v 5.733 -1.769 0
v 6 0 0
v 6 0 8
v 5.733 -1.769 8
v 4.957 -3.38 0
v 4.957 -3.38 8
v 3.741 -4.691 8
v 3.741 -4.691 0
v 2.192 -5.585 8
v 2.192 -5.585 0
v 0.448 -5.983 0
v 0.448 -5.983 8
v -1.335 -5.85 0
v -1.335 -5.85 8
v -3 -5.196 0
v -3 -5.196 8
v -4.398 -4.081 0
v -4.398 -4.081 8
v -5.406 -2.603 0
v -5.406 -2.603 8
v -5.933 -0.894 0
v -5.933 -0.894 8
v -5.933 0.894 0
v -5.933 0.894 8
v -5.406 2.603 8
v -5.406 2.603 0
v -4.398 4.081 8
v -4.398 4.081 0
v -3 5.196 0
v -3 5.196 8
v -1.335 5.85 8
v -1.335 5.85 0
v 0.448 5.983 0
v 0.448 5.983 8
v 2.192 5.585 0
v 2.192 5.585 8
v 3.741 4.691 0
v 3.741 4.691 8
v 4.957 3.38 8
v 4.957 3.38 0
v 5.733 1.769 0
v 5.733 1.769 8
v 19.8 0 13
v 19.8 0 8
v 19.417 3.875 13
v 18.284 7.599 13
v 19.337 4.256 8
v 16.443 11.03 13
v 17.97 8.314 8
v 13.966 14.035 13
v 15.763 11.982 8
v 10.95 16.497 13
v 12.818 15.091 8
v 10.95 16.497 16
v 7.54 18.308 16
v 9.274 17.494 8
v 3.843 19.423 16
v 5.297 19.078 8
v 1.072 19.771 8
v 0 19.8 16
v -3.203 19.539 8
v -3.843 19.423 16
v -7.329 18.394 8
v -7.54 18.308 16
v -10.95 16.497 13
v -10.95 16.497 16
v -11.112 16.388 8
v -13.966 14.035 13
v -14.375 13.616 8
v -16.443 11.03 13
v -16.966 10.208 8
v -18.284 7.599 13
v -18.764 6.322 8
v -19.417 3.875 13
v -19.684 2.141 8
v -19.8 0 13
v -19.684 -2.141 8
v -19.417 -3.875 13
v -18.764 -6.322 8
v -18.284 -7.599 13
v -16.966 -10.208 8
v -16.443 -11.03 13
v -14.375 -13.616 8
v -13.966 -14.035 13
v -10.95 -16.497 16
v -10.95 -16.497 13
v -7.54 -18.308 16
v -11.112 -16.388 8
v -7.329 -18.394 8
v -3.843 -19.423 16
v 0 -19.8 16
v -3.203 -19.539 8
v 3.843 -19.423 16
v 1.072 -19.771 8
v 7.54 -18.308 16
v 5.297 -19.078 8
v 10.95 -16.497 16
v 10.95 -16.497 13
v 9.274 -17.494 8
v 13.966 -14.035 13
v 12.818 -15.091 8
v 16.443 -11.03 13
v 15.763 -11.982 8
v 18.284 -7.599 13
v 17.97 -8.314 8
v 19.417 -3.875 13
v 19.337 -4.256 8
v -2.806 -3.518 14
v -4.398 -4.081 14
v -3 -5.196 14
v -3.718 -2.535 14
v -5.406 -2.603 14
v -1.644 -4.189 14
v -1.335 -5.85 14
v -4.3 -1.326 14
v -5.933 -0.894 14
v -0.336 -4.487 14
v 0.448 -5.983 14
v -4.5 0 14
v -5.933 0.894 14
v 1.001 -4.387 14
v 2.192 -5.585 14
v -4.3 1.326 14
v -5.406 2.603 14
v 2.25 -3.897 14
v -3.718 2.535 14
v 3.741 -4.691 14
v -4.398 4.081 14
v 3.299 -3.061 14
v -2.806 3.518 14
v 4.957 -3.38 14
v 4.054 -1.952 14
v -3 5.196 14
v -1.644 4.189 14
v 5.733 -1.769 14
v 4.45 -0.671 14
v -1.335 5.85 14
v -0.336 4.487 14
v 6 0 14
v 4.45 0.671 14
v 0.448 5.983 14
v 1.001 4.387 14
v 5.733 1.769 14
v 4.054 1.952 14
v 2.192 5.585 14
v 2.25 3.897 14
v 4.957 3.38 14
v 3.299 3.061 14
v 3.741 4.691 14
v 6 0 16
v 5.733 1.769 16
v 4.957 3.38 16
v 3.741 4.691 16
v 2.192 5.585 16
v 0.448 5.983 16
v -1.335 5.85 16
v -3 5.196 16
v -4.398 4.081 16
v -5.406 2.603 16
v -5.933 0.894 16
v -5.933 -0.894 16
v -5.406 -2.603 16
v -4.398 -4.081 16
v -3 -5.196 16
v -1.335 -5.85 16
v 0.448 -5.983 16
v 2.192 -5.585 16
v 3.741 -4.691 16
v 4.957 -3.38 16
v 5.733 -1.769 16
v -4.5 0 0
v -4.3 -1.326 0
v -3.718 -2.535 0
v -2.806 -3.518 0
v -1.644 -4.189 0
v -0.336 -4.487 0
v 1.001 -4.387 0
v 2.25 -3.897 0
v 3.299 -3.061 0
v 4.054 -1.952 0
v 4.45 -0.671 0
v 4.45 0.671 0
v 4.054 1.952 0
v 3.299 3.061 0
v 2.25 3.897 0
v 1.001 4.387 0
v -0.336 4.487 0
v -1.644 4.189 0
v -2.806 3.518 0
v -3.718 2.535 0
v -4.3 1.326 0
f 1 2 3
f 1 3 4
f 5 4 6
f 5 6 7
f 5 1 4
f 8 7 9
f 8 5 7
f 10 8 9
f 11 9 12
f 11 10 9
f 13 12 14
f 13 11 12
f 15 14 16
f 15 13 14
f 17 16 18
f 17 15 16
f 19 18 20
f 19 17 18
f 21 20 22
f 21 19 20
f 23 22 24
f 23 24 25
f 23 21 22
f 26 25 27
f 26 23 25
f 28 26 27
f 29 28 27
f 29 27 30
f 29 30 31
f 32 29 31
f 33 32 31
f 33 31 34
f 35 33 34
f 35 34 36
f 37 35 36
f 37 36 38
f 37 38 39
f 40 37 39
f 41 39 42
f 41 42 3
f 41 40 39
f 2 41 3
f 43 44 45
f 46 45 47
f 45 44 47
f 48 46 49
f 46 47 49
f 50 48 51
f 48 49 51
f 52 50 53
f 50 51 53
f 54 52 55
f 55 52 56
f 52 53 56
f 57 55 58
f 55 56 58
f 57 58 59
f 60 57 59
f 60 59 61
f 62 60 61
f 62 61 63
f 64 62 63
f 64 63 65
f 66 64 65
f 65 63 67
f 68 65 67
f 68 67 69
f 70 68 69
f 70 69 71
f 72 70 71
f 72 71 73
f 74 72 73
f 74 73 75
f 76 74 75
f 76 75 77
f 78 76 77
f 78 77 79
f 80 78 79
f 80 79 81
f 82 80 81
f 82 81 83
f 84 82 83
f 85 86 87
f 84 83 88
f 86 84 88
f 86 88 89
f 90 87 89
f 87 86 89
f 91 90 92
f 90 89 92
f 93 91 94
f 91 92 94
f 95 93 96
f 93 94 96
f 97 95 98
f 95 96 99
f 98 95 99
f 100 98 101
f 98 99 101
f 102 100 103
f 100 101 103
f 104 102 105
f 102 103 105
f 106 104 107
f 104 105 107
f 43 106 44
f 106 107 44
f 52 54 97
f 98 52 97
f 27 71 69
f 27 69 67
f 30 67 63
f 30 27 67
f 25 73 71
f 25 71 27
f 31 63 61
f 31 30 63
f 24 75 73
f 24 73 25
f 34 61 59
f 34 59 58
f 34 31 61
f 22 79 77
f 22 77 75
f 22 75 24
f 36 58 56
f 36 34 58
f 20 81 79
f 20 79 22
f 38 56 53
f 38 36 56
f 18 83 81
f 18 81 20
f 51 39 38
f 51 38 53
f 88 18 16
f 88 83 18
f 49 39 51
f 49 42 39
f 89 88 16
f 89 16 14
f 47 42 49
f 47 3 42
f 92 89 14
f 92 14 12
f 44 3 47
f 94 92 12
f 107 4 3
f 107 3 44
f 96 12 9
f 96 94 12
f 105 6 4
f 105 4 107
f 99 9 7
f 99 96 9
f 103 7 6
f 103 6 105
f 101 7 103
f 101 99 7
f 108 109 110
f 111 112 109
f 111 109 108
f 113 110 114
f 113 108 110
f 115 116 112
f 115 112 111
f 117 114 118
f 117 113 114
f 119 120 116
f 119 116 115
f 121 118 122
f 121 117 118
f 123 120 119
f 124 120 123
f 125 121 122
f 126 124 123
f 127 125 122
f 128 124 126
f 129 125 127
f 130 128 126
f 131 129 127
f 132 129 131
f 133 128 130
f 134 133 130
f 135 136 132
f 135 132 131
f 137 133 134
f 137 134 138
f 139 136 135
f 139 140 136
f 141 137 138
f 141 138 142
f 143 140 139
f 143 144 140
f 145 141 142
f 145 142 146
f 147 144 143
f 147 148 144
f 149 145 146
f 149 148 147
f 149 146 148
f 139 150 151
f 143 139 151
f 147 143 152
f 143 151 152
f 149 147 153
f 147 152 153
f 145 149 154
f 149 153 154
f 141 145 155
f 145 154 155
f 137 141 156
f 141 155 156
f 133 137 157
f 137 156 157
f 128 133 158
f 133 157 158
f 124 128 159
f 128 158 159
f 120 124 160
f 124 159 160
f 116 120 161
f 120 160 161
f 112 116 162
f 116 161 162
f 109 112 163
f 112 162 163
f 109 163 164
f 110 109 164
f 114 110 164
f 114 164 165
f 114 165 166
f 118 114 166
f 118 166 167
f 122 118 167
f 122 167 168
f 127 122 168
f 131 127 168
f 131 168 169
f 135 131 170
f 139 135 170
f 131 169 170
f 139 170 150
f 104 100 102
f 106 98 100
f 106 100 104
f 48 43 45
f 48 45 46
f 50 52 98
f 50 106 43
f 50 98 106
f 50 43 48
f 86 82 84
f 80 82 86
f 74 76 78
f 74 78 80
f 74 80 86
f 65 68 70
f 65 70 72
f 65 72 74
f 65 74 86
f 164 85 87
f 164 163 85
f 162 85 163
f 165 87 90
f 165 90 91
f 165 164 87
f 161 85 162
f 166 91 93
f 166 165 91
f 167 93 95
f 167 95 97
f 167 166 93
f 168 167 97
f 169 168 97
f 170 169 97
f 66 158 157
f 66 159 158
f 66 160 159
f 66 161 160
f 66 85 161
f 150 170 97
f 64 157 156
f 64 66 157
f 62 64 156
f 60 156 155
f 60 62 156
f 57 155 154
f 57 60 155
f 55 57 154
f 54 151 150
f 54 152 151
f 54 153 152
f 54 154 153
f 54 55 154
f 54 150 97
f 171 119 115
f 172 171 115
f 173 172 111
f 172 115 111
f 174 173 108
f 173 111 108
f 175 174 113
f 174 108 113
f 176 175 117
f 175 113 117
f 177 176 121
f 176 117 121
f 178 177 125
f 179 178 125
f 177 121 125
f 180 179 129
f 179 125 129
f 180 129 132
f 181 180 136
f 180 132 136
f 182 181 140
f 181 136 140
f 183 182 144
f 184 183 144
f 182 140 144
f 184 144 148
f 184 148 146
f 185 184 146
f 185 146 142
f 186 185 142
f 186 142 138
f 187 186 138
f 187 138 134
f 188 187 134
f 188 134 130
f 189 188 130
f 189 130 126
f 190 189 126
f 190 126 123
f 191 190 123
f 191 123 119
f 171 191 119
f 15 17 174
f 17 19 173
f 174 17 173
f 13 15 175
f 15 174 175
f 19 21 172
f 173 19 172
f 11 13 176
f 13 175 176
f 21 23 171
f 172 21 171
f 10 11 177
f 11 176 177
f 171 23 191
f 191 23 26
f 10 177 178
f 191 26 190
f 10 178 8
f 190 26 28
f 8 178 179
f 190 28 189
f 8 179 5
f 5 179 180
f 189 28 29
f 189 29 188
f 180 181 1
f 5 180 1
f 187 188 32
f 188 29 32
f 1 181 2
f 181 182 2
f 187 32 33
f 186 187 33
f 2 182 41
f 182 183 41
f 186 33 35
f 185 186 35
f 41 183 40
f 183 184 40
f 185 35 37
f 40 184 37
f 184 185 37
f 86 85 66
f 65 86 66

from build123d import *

# Parameters (mm, degrees)
F0_R     = 19.8
F1_DEPTH = 16
F3_DEPTH = 3
F4_R     = 19.8
F4_R_2   = 6
F5_DEPTH = 8
F7_D     = 9
F8_R     = 6
F8_R_2   = 4.5
F9_DEPTH = 2


with BuildPart() as f1:
    # F0 (on Top) → F1 (new body)
    with BuildSketch(Plane.XY):
        Circle(F0_R)
    extrude(amount=F1_DEPTH)

    # F2 (on face) → F3 (cut)
    with BuildSketch(Plane.XY.offset(16)):
        with BuildLine():
            Line((-10.95, -16.4965905568), (-10.95, 16.4965905568))
            ThreePointArc((-10.95, 16.4965905568), (-19.8, 0), (-10.95, -16.4965905568))
        make_face()
        with BuildLine():
            ThreePointArc((19.8, 0), (17.4477792283, 9.3602884571), (10.95, 16.4965905568))
            Line((10.95, 16.4965905568), (10.95, -16.4965905568))
            ThreePointArc((10.95, -16.4965905568), (17.4477792283, -9.3602884571), (19.8, 0))
        make_face()
    extrude(amount=-F3_DEPTH, mode=Mode.SUBTRACT)

    # F4 (on face) → F5 (cut)
    with BuildSketch(Plane(origin=(0, 0, 0), x_dir=(1, 0, 0), z_dir=(0, 0, -1))):
        Circle(F4_R)
        Circle(F4_R_2, mode=Mode.SUBTRACT)
    extrude(amount=-F5_DEPTH, mode=Mode.SUBTRACT)

    # F7 (through all)
    with Locations(Plane(origin=(0, 0, 0), x_dir=(1, 0, 0), z_dir=(0, 0, -1))):
        with Locations((0, 0)):
            Hole(F7_D / 2)

    # F8 (on face) → F9 (cut)
    with BuildSketch(Plane.XY.offset(16)):
        Circle(F8_R)
        Circle(F8_R_2, mode=Mode.SUBTRACT)
    extrude(amount=-F9_DEPTH, mode=Mode.SUBTRACT)


solid = f1.part
